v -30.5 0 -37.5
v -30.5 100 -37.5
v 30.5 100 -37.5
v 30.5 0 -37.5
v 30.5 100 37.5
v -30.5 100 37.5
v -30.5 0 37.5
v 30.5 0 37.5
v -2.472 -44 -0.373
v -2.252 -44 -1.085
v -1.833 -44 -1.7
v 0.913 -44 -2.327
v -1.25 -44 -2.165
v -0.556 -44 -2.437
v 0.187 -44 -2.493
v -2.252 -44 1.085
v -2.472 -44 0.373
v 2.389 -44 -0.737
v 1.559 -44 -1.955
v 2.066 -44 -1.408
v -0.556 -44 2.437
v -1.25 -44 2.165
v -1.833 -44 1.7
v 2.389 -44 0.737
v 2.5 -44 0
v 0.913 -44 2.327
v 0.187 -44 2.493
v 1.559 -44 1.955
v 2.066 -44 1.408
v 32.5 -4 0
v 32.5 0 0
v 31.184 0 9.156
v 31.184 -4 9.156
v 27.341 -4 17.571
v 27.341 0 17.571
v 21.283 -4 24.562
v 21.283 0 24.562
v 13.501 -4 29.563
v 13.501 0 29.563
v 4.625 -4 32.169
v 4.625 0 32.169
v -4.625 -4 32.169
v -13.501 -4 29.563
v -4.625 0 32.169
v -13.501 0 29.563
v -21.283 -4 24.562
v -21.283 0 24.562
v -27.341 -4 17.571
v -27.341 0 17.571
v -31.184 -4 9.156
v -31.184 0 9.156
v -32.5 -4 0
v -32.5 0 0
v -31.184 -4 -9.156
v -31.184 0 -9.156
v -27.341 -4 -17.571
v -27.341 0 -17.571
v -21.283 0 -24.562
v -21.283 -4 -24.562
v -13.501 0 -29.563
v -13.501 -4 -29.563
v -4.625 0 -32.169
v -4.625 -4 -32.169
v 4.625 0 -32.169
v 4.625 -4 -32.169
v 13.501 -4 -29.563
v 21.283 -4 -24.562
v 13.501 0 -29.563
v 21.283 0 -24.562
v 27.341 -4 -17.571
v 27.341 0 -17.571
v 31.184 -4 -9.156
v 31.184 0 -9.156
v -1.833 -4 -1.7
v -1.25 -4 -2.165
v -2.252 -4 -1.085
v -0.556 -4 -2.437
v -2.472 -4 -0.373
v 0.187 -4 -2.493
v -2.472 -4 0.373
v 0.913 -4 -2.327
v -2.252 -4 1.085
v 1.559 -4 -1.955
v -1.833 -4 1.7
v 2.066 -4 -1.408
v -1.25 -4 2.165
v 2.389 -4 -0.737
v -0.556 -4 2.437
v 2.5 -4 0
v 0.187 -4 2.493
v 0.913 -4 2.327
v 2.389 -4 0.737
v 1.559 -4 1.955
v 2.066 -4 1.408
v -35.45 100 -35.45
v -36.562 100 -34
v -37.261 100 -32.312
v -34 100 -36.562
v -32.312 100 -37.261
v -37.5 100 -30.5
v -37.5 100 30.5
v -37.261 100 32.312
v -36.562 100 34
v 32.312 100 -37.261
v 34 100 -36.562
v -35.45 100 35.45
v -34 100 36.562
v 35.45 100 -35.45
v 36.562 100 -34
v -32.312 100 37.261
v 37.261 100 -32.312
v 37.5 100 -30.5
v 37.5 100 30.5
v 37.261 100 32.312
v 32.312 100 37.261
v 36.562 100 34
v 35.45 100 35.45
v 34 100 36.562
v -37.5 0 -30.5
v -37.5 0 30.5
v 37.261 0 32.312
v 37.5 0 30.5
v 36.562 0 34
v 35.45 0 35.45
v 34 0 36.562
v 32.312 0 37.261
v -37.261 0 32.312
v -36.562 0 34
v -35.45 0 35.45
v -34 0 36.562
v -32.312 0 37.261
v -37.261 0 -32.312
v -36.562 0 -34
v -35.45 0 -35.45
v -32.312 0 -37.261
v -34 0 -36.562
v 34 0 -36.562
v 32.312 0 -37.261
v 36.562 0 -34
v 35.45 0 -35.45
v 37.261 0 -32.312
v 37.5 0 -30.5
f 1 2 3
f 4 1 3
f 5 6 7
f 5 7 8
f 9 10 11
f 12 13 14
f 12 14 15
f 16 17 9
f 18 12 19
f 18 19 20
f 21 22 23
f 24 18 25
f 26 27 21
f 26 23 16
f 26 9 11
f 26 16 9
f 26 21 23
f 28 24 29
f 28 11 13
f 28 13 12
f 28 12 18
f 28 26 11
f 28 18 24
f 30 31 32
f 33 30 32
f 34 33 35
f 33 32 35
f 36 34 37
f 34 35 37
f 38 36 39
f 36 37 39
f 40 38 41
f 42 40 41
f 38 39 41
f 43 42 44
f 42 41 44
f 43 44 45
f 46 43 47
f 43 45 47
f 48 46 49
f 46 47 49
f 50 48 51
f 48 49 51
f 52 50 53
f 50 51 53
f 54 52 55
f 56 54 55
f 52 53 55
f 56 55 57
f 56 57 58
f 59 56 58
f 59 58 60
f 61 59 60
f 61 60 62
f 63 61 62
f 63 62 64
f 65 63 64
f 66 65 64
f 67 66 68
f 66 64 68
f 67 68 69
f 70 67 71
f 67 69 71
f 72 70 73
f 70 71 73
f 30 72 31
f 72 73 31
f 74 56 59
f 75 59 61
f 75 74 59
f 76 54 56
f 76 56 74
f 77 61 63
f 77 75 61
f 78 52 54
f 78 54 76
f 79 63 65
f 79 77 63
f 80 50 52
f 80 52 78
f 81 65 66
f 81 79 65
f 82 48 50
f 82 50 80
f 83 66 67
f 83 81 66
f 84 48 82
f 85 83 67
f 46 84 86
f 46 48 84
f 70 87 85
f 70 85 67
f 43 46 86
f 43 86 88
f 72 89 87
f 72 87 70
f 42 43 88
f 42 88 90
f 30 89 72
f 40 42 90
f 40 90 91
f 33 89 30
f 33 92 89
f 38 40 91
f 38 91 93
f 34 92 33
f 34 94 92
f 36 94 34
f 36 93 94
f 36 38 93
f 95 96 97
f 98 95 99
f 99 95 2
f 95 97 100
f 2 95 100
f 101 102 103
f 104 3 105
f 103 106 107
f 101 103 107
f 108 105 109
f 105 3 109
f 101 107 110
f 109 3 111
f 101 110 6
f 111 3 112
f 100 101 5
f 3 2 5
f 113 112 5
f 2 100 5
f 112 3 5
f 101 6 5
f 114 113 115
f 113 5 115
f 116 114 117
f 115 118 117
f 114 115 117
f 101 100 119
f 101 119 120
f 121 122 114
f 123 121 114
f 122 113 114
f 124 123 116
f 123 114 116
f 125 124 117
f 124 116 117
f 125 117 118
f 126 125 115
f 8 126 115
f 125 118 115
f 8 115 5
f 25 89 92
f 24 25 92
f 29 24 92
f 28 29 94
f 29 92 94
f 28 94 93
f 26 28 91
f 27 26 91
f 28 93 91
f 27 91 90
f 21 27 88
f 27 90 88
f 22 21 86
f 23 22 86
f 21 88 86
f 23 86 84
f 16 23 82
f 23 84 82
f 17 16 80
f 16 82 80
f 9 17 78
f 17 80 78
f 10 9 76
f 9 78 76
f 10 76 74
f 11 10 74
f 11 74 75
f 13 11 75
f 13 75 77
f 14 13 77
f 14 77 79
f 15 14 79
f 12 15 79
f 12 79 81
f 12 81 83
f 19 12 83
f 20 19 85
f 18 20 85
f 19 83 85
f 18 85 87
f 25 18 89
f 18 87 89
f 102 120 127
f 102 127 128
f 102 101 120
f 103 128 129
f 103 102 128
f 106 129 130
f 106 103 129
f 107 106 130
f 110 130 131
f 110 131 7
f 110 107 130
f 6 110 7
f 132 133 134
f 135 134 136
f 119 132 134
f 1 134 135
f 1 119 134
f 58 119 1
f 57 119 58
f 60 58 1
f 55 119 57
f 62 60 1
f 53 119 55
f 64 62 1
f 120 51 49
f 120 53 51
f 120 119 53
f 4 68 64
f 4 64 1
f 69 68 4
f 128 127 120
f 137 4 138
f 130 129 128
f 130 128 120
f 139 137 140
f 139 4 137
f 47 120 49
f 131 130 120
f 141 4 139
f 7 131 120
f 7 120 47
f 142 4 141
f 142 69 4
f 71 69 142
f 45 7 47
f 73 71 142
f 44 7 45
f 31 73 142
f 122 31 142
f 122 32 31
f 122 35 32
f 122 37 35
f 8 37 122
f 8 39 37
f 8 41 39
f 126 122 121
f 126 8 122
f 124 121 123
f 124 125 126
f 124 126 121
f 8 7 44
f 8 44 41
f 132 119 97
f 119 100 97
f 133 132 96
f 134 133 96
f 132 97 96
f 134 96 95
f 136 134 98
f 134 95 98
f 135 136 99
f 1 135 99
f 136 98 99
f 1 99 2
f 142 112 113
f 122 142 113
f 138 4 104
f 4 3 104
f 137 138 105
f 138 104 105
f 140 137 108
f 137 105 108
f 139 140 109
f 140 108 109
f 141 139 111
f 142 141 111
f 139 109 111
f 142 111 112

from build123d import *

# Parameters (mm, degrees)
F0_W     = 75
F0_H     = 75
F1_DEPTH = 100
F2_R     = 7
F3_R     = 32.5
F4_DEPTH = 4
F5_R     = 2.5
F6_DEPTH = 40


with BuildPart() as f1:
    # F0 (on Front) → F1 (new body)
    with BuildSketch(Plane.XZ):
        Rectangle(F0_W, F0_H)
    extrude(amount=-F1_DEPTH)

    # F2
    f2_edges = [f1.edges().sort_by_distance(p)[0] for p in [
        (37.5, 50, 37.5),
        (37.5, 50, -37.5),
        (-37.5, 50, -37.5),
        (-37.5, 50, 37.5),
    ]]
    fillet(f2_edges, radius=F2_R)

    # F3 (on face) → F4 (join)
    with BuildSketch(Plane.XZ):
        Circle(F3_R)
    extrude(amount=F4_DEPTH)

    # F5 (on face) → F6 (join)
    with BuildSketch(Plane.XZ.offset(4)):
        Circle(F5_R)
    extrude(amount=F6_DEPTH)


solid = f1.part
